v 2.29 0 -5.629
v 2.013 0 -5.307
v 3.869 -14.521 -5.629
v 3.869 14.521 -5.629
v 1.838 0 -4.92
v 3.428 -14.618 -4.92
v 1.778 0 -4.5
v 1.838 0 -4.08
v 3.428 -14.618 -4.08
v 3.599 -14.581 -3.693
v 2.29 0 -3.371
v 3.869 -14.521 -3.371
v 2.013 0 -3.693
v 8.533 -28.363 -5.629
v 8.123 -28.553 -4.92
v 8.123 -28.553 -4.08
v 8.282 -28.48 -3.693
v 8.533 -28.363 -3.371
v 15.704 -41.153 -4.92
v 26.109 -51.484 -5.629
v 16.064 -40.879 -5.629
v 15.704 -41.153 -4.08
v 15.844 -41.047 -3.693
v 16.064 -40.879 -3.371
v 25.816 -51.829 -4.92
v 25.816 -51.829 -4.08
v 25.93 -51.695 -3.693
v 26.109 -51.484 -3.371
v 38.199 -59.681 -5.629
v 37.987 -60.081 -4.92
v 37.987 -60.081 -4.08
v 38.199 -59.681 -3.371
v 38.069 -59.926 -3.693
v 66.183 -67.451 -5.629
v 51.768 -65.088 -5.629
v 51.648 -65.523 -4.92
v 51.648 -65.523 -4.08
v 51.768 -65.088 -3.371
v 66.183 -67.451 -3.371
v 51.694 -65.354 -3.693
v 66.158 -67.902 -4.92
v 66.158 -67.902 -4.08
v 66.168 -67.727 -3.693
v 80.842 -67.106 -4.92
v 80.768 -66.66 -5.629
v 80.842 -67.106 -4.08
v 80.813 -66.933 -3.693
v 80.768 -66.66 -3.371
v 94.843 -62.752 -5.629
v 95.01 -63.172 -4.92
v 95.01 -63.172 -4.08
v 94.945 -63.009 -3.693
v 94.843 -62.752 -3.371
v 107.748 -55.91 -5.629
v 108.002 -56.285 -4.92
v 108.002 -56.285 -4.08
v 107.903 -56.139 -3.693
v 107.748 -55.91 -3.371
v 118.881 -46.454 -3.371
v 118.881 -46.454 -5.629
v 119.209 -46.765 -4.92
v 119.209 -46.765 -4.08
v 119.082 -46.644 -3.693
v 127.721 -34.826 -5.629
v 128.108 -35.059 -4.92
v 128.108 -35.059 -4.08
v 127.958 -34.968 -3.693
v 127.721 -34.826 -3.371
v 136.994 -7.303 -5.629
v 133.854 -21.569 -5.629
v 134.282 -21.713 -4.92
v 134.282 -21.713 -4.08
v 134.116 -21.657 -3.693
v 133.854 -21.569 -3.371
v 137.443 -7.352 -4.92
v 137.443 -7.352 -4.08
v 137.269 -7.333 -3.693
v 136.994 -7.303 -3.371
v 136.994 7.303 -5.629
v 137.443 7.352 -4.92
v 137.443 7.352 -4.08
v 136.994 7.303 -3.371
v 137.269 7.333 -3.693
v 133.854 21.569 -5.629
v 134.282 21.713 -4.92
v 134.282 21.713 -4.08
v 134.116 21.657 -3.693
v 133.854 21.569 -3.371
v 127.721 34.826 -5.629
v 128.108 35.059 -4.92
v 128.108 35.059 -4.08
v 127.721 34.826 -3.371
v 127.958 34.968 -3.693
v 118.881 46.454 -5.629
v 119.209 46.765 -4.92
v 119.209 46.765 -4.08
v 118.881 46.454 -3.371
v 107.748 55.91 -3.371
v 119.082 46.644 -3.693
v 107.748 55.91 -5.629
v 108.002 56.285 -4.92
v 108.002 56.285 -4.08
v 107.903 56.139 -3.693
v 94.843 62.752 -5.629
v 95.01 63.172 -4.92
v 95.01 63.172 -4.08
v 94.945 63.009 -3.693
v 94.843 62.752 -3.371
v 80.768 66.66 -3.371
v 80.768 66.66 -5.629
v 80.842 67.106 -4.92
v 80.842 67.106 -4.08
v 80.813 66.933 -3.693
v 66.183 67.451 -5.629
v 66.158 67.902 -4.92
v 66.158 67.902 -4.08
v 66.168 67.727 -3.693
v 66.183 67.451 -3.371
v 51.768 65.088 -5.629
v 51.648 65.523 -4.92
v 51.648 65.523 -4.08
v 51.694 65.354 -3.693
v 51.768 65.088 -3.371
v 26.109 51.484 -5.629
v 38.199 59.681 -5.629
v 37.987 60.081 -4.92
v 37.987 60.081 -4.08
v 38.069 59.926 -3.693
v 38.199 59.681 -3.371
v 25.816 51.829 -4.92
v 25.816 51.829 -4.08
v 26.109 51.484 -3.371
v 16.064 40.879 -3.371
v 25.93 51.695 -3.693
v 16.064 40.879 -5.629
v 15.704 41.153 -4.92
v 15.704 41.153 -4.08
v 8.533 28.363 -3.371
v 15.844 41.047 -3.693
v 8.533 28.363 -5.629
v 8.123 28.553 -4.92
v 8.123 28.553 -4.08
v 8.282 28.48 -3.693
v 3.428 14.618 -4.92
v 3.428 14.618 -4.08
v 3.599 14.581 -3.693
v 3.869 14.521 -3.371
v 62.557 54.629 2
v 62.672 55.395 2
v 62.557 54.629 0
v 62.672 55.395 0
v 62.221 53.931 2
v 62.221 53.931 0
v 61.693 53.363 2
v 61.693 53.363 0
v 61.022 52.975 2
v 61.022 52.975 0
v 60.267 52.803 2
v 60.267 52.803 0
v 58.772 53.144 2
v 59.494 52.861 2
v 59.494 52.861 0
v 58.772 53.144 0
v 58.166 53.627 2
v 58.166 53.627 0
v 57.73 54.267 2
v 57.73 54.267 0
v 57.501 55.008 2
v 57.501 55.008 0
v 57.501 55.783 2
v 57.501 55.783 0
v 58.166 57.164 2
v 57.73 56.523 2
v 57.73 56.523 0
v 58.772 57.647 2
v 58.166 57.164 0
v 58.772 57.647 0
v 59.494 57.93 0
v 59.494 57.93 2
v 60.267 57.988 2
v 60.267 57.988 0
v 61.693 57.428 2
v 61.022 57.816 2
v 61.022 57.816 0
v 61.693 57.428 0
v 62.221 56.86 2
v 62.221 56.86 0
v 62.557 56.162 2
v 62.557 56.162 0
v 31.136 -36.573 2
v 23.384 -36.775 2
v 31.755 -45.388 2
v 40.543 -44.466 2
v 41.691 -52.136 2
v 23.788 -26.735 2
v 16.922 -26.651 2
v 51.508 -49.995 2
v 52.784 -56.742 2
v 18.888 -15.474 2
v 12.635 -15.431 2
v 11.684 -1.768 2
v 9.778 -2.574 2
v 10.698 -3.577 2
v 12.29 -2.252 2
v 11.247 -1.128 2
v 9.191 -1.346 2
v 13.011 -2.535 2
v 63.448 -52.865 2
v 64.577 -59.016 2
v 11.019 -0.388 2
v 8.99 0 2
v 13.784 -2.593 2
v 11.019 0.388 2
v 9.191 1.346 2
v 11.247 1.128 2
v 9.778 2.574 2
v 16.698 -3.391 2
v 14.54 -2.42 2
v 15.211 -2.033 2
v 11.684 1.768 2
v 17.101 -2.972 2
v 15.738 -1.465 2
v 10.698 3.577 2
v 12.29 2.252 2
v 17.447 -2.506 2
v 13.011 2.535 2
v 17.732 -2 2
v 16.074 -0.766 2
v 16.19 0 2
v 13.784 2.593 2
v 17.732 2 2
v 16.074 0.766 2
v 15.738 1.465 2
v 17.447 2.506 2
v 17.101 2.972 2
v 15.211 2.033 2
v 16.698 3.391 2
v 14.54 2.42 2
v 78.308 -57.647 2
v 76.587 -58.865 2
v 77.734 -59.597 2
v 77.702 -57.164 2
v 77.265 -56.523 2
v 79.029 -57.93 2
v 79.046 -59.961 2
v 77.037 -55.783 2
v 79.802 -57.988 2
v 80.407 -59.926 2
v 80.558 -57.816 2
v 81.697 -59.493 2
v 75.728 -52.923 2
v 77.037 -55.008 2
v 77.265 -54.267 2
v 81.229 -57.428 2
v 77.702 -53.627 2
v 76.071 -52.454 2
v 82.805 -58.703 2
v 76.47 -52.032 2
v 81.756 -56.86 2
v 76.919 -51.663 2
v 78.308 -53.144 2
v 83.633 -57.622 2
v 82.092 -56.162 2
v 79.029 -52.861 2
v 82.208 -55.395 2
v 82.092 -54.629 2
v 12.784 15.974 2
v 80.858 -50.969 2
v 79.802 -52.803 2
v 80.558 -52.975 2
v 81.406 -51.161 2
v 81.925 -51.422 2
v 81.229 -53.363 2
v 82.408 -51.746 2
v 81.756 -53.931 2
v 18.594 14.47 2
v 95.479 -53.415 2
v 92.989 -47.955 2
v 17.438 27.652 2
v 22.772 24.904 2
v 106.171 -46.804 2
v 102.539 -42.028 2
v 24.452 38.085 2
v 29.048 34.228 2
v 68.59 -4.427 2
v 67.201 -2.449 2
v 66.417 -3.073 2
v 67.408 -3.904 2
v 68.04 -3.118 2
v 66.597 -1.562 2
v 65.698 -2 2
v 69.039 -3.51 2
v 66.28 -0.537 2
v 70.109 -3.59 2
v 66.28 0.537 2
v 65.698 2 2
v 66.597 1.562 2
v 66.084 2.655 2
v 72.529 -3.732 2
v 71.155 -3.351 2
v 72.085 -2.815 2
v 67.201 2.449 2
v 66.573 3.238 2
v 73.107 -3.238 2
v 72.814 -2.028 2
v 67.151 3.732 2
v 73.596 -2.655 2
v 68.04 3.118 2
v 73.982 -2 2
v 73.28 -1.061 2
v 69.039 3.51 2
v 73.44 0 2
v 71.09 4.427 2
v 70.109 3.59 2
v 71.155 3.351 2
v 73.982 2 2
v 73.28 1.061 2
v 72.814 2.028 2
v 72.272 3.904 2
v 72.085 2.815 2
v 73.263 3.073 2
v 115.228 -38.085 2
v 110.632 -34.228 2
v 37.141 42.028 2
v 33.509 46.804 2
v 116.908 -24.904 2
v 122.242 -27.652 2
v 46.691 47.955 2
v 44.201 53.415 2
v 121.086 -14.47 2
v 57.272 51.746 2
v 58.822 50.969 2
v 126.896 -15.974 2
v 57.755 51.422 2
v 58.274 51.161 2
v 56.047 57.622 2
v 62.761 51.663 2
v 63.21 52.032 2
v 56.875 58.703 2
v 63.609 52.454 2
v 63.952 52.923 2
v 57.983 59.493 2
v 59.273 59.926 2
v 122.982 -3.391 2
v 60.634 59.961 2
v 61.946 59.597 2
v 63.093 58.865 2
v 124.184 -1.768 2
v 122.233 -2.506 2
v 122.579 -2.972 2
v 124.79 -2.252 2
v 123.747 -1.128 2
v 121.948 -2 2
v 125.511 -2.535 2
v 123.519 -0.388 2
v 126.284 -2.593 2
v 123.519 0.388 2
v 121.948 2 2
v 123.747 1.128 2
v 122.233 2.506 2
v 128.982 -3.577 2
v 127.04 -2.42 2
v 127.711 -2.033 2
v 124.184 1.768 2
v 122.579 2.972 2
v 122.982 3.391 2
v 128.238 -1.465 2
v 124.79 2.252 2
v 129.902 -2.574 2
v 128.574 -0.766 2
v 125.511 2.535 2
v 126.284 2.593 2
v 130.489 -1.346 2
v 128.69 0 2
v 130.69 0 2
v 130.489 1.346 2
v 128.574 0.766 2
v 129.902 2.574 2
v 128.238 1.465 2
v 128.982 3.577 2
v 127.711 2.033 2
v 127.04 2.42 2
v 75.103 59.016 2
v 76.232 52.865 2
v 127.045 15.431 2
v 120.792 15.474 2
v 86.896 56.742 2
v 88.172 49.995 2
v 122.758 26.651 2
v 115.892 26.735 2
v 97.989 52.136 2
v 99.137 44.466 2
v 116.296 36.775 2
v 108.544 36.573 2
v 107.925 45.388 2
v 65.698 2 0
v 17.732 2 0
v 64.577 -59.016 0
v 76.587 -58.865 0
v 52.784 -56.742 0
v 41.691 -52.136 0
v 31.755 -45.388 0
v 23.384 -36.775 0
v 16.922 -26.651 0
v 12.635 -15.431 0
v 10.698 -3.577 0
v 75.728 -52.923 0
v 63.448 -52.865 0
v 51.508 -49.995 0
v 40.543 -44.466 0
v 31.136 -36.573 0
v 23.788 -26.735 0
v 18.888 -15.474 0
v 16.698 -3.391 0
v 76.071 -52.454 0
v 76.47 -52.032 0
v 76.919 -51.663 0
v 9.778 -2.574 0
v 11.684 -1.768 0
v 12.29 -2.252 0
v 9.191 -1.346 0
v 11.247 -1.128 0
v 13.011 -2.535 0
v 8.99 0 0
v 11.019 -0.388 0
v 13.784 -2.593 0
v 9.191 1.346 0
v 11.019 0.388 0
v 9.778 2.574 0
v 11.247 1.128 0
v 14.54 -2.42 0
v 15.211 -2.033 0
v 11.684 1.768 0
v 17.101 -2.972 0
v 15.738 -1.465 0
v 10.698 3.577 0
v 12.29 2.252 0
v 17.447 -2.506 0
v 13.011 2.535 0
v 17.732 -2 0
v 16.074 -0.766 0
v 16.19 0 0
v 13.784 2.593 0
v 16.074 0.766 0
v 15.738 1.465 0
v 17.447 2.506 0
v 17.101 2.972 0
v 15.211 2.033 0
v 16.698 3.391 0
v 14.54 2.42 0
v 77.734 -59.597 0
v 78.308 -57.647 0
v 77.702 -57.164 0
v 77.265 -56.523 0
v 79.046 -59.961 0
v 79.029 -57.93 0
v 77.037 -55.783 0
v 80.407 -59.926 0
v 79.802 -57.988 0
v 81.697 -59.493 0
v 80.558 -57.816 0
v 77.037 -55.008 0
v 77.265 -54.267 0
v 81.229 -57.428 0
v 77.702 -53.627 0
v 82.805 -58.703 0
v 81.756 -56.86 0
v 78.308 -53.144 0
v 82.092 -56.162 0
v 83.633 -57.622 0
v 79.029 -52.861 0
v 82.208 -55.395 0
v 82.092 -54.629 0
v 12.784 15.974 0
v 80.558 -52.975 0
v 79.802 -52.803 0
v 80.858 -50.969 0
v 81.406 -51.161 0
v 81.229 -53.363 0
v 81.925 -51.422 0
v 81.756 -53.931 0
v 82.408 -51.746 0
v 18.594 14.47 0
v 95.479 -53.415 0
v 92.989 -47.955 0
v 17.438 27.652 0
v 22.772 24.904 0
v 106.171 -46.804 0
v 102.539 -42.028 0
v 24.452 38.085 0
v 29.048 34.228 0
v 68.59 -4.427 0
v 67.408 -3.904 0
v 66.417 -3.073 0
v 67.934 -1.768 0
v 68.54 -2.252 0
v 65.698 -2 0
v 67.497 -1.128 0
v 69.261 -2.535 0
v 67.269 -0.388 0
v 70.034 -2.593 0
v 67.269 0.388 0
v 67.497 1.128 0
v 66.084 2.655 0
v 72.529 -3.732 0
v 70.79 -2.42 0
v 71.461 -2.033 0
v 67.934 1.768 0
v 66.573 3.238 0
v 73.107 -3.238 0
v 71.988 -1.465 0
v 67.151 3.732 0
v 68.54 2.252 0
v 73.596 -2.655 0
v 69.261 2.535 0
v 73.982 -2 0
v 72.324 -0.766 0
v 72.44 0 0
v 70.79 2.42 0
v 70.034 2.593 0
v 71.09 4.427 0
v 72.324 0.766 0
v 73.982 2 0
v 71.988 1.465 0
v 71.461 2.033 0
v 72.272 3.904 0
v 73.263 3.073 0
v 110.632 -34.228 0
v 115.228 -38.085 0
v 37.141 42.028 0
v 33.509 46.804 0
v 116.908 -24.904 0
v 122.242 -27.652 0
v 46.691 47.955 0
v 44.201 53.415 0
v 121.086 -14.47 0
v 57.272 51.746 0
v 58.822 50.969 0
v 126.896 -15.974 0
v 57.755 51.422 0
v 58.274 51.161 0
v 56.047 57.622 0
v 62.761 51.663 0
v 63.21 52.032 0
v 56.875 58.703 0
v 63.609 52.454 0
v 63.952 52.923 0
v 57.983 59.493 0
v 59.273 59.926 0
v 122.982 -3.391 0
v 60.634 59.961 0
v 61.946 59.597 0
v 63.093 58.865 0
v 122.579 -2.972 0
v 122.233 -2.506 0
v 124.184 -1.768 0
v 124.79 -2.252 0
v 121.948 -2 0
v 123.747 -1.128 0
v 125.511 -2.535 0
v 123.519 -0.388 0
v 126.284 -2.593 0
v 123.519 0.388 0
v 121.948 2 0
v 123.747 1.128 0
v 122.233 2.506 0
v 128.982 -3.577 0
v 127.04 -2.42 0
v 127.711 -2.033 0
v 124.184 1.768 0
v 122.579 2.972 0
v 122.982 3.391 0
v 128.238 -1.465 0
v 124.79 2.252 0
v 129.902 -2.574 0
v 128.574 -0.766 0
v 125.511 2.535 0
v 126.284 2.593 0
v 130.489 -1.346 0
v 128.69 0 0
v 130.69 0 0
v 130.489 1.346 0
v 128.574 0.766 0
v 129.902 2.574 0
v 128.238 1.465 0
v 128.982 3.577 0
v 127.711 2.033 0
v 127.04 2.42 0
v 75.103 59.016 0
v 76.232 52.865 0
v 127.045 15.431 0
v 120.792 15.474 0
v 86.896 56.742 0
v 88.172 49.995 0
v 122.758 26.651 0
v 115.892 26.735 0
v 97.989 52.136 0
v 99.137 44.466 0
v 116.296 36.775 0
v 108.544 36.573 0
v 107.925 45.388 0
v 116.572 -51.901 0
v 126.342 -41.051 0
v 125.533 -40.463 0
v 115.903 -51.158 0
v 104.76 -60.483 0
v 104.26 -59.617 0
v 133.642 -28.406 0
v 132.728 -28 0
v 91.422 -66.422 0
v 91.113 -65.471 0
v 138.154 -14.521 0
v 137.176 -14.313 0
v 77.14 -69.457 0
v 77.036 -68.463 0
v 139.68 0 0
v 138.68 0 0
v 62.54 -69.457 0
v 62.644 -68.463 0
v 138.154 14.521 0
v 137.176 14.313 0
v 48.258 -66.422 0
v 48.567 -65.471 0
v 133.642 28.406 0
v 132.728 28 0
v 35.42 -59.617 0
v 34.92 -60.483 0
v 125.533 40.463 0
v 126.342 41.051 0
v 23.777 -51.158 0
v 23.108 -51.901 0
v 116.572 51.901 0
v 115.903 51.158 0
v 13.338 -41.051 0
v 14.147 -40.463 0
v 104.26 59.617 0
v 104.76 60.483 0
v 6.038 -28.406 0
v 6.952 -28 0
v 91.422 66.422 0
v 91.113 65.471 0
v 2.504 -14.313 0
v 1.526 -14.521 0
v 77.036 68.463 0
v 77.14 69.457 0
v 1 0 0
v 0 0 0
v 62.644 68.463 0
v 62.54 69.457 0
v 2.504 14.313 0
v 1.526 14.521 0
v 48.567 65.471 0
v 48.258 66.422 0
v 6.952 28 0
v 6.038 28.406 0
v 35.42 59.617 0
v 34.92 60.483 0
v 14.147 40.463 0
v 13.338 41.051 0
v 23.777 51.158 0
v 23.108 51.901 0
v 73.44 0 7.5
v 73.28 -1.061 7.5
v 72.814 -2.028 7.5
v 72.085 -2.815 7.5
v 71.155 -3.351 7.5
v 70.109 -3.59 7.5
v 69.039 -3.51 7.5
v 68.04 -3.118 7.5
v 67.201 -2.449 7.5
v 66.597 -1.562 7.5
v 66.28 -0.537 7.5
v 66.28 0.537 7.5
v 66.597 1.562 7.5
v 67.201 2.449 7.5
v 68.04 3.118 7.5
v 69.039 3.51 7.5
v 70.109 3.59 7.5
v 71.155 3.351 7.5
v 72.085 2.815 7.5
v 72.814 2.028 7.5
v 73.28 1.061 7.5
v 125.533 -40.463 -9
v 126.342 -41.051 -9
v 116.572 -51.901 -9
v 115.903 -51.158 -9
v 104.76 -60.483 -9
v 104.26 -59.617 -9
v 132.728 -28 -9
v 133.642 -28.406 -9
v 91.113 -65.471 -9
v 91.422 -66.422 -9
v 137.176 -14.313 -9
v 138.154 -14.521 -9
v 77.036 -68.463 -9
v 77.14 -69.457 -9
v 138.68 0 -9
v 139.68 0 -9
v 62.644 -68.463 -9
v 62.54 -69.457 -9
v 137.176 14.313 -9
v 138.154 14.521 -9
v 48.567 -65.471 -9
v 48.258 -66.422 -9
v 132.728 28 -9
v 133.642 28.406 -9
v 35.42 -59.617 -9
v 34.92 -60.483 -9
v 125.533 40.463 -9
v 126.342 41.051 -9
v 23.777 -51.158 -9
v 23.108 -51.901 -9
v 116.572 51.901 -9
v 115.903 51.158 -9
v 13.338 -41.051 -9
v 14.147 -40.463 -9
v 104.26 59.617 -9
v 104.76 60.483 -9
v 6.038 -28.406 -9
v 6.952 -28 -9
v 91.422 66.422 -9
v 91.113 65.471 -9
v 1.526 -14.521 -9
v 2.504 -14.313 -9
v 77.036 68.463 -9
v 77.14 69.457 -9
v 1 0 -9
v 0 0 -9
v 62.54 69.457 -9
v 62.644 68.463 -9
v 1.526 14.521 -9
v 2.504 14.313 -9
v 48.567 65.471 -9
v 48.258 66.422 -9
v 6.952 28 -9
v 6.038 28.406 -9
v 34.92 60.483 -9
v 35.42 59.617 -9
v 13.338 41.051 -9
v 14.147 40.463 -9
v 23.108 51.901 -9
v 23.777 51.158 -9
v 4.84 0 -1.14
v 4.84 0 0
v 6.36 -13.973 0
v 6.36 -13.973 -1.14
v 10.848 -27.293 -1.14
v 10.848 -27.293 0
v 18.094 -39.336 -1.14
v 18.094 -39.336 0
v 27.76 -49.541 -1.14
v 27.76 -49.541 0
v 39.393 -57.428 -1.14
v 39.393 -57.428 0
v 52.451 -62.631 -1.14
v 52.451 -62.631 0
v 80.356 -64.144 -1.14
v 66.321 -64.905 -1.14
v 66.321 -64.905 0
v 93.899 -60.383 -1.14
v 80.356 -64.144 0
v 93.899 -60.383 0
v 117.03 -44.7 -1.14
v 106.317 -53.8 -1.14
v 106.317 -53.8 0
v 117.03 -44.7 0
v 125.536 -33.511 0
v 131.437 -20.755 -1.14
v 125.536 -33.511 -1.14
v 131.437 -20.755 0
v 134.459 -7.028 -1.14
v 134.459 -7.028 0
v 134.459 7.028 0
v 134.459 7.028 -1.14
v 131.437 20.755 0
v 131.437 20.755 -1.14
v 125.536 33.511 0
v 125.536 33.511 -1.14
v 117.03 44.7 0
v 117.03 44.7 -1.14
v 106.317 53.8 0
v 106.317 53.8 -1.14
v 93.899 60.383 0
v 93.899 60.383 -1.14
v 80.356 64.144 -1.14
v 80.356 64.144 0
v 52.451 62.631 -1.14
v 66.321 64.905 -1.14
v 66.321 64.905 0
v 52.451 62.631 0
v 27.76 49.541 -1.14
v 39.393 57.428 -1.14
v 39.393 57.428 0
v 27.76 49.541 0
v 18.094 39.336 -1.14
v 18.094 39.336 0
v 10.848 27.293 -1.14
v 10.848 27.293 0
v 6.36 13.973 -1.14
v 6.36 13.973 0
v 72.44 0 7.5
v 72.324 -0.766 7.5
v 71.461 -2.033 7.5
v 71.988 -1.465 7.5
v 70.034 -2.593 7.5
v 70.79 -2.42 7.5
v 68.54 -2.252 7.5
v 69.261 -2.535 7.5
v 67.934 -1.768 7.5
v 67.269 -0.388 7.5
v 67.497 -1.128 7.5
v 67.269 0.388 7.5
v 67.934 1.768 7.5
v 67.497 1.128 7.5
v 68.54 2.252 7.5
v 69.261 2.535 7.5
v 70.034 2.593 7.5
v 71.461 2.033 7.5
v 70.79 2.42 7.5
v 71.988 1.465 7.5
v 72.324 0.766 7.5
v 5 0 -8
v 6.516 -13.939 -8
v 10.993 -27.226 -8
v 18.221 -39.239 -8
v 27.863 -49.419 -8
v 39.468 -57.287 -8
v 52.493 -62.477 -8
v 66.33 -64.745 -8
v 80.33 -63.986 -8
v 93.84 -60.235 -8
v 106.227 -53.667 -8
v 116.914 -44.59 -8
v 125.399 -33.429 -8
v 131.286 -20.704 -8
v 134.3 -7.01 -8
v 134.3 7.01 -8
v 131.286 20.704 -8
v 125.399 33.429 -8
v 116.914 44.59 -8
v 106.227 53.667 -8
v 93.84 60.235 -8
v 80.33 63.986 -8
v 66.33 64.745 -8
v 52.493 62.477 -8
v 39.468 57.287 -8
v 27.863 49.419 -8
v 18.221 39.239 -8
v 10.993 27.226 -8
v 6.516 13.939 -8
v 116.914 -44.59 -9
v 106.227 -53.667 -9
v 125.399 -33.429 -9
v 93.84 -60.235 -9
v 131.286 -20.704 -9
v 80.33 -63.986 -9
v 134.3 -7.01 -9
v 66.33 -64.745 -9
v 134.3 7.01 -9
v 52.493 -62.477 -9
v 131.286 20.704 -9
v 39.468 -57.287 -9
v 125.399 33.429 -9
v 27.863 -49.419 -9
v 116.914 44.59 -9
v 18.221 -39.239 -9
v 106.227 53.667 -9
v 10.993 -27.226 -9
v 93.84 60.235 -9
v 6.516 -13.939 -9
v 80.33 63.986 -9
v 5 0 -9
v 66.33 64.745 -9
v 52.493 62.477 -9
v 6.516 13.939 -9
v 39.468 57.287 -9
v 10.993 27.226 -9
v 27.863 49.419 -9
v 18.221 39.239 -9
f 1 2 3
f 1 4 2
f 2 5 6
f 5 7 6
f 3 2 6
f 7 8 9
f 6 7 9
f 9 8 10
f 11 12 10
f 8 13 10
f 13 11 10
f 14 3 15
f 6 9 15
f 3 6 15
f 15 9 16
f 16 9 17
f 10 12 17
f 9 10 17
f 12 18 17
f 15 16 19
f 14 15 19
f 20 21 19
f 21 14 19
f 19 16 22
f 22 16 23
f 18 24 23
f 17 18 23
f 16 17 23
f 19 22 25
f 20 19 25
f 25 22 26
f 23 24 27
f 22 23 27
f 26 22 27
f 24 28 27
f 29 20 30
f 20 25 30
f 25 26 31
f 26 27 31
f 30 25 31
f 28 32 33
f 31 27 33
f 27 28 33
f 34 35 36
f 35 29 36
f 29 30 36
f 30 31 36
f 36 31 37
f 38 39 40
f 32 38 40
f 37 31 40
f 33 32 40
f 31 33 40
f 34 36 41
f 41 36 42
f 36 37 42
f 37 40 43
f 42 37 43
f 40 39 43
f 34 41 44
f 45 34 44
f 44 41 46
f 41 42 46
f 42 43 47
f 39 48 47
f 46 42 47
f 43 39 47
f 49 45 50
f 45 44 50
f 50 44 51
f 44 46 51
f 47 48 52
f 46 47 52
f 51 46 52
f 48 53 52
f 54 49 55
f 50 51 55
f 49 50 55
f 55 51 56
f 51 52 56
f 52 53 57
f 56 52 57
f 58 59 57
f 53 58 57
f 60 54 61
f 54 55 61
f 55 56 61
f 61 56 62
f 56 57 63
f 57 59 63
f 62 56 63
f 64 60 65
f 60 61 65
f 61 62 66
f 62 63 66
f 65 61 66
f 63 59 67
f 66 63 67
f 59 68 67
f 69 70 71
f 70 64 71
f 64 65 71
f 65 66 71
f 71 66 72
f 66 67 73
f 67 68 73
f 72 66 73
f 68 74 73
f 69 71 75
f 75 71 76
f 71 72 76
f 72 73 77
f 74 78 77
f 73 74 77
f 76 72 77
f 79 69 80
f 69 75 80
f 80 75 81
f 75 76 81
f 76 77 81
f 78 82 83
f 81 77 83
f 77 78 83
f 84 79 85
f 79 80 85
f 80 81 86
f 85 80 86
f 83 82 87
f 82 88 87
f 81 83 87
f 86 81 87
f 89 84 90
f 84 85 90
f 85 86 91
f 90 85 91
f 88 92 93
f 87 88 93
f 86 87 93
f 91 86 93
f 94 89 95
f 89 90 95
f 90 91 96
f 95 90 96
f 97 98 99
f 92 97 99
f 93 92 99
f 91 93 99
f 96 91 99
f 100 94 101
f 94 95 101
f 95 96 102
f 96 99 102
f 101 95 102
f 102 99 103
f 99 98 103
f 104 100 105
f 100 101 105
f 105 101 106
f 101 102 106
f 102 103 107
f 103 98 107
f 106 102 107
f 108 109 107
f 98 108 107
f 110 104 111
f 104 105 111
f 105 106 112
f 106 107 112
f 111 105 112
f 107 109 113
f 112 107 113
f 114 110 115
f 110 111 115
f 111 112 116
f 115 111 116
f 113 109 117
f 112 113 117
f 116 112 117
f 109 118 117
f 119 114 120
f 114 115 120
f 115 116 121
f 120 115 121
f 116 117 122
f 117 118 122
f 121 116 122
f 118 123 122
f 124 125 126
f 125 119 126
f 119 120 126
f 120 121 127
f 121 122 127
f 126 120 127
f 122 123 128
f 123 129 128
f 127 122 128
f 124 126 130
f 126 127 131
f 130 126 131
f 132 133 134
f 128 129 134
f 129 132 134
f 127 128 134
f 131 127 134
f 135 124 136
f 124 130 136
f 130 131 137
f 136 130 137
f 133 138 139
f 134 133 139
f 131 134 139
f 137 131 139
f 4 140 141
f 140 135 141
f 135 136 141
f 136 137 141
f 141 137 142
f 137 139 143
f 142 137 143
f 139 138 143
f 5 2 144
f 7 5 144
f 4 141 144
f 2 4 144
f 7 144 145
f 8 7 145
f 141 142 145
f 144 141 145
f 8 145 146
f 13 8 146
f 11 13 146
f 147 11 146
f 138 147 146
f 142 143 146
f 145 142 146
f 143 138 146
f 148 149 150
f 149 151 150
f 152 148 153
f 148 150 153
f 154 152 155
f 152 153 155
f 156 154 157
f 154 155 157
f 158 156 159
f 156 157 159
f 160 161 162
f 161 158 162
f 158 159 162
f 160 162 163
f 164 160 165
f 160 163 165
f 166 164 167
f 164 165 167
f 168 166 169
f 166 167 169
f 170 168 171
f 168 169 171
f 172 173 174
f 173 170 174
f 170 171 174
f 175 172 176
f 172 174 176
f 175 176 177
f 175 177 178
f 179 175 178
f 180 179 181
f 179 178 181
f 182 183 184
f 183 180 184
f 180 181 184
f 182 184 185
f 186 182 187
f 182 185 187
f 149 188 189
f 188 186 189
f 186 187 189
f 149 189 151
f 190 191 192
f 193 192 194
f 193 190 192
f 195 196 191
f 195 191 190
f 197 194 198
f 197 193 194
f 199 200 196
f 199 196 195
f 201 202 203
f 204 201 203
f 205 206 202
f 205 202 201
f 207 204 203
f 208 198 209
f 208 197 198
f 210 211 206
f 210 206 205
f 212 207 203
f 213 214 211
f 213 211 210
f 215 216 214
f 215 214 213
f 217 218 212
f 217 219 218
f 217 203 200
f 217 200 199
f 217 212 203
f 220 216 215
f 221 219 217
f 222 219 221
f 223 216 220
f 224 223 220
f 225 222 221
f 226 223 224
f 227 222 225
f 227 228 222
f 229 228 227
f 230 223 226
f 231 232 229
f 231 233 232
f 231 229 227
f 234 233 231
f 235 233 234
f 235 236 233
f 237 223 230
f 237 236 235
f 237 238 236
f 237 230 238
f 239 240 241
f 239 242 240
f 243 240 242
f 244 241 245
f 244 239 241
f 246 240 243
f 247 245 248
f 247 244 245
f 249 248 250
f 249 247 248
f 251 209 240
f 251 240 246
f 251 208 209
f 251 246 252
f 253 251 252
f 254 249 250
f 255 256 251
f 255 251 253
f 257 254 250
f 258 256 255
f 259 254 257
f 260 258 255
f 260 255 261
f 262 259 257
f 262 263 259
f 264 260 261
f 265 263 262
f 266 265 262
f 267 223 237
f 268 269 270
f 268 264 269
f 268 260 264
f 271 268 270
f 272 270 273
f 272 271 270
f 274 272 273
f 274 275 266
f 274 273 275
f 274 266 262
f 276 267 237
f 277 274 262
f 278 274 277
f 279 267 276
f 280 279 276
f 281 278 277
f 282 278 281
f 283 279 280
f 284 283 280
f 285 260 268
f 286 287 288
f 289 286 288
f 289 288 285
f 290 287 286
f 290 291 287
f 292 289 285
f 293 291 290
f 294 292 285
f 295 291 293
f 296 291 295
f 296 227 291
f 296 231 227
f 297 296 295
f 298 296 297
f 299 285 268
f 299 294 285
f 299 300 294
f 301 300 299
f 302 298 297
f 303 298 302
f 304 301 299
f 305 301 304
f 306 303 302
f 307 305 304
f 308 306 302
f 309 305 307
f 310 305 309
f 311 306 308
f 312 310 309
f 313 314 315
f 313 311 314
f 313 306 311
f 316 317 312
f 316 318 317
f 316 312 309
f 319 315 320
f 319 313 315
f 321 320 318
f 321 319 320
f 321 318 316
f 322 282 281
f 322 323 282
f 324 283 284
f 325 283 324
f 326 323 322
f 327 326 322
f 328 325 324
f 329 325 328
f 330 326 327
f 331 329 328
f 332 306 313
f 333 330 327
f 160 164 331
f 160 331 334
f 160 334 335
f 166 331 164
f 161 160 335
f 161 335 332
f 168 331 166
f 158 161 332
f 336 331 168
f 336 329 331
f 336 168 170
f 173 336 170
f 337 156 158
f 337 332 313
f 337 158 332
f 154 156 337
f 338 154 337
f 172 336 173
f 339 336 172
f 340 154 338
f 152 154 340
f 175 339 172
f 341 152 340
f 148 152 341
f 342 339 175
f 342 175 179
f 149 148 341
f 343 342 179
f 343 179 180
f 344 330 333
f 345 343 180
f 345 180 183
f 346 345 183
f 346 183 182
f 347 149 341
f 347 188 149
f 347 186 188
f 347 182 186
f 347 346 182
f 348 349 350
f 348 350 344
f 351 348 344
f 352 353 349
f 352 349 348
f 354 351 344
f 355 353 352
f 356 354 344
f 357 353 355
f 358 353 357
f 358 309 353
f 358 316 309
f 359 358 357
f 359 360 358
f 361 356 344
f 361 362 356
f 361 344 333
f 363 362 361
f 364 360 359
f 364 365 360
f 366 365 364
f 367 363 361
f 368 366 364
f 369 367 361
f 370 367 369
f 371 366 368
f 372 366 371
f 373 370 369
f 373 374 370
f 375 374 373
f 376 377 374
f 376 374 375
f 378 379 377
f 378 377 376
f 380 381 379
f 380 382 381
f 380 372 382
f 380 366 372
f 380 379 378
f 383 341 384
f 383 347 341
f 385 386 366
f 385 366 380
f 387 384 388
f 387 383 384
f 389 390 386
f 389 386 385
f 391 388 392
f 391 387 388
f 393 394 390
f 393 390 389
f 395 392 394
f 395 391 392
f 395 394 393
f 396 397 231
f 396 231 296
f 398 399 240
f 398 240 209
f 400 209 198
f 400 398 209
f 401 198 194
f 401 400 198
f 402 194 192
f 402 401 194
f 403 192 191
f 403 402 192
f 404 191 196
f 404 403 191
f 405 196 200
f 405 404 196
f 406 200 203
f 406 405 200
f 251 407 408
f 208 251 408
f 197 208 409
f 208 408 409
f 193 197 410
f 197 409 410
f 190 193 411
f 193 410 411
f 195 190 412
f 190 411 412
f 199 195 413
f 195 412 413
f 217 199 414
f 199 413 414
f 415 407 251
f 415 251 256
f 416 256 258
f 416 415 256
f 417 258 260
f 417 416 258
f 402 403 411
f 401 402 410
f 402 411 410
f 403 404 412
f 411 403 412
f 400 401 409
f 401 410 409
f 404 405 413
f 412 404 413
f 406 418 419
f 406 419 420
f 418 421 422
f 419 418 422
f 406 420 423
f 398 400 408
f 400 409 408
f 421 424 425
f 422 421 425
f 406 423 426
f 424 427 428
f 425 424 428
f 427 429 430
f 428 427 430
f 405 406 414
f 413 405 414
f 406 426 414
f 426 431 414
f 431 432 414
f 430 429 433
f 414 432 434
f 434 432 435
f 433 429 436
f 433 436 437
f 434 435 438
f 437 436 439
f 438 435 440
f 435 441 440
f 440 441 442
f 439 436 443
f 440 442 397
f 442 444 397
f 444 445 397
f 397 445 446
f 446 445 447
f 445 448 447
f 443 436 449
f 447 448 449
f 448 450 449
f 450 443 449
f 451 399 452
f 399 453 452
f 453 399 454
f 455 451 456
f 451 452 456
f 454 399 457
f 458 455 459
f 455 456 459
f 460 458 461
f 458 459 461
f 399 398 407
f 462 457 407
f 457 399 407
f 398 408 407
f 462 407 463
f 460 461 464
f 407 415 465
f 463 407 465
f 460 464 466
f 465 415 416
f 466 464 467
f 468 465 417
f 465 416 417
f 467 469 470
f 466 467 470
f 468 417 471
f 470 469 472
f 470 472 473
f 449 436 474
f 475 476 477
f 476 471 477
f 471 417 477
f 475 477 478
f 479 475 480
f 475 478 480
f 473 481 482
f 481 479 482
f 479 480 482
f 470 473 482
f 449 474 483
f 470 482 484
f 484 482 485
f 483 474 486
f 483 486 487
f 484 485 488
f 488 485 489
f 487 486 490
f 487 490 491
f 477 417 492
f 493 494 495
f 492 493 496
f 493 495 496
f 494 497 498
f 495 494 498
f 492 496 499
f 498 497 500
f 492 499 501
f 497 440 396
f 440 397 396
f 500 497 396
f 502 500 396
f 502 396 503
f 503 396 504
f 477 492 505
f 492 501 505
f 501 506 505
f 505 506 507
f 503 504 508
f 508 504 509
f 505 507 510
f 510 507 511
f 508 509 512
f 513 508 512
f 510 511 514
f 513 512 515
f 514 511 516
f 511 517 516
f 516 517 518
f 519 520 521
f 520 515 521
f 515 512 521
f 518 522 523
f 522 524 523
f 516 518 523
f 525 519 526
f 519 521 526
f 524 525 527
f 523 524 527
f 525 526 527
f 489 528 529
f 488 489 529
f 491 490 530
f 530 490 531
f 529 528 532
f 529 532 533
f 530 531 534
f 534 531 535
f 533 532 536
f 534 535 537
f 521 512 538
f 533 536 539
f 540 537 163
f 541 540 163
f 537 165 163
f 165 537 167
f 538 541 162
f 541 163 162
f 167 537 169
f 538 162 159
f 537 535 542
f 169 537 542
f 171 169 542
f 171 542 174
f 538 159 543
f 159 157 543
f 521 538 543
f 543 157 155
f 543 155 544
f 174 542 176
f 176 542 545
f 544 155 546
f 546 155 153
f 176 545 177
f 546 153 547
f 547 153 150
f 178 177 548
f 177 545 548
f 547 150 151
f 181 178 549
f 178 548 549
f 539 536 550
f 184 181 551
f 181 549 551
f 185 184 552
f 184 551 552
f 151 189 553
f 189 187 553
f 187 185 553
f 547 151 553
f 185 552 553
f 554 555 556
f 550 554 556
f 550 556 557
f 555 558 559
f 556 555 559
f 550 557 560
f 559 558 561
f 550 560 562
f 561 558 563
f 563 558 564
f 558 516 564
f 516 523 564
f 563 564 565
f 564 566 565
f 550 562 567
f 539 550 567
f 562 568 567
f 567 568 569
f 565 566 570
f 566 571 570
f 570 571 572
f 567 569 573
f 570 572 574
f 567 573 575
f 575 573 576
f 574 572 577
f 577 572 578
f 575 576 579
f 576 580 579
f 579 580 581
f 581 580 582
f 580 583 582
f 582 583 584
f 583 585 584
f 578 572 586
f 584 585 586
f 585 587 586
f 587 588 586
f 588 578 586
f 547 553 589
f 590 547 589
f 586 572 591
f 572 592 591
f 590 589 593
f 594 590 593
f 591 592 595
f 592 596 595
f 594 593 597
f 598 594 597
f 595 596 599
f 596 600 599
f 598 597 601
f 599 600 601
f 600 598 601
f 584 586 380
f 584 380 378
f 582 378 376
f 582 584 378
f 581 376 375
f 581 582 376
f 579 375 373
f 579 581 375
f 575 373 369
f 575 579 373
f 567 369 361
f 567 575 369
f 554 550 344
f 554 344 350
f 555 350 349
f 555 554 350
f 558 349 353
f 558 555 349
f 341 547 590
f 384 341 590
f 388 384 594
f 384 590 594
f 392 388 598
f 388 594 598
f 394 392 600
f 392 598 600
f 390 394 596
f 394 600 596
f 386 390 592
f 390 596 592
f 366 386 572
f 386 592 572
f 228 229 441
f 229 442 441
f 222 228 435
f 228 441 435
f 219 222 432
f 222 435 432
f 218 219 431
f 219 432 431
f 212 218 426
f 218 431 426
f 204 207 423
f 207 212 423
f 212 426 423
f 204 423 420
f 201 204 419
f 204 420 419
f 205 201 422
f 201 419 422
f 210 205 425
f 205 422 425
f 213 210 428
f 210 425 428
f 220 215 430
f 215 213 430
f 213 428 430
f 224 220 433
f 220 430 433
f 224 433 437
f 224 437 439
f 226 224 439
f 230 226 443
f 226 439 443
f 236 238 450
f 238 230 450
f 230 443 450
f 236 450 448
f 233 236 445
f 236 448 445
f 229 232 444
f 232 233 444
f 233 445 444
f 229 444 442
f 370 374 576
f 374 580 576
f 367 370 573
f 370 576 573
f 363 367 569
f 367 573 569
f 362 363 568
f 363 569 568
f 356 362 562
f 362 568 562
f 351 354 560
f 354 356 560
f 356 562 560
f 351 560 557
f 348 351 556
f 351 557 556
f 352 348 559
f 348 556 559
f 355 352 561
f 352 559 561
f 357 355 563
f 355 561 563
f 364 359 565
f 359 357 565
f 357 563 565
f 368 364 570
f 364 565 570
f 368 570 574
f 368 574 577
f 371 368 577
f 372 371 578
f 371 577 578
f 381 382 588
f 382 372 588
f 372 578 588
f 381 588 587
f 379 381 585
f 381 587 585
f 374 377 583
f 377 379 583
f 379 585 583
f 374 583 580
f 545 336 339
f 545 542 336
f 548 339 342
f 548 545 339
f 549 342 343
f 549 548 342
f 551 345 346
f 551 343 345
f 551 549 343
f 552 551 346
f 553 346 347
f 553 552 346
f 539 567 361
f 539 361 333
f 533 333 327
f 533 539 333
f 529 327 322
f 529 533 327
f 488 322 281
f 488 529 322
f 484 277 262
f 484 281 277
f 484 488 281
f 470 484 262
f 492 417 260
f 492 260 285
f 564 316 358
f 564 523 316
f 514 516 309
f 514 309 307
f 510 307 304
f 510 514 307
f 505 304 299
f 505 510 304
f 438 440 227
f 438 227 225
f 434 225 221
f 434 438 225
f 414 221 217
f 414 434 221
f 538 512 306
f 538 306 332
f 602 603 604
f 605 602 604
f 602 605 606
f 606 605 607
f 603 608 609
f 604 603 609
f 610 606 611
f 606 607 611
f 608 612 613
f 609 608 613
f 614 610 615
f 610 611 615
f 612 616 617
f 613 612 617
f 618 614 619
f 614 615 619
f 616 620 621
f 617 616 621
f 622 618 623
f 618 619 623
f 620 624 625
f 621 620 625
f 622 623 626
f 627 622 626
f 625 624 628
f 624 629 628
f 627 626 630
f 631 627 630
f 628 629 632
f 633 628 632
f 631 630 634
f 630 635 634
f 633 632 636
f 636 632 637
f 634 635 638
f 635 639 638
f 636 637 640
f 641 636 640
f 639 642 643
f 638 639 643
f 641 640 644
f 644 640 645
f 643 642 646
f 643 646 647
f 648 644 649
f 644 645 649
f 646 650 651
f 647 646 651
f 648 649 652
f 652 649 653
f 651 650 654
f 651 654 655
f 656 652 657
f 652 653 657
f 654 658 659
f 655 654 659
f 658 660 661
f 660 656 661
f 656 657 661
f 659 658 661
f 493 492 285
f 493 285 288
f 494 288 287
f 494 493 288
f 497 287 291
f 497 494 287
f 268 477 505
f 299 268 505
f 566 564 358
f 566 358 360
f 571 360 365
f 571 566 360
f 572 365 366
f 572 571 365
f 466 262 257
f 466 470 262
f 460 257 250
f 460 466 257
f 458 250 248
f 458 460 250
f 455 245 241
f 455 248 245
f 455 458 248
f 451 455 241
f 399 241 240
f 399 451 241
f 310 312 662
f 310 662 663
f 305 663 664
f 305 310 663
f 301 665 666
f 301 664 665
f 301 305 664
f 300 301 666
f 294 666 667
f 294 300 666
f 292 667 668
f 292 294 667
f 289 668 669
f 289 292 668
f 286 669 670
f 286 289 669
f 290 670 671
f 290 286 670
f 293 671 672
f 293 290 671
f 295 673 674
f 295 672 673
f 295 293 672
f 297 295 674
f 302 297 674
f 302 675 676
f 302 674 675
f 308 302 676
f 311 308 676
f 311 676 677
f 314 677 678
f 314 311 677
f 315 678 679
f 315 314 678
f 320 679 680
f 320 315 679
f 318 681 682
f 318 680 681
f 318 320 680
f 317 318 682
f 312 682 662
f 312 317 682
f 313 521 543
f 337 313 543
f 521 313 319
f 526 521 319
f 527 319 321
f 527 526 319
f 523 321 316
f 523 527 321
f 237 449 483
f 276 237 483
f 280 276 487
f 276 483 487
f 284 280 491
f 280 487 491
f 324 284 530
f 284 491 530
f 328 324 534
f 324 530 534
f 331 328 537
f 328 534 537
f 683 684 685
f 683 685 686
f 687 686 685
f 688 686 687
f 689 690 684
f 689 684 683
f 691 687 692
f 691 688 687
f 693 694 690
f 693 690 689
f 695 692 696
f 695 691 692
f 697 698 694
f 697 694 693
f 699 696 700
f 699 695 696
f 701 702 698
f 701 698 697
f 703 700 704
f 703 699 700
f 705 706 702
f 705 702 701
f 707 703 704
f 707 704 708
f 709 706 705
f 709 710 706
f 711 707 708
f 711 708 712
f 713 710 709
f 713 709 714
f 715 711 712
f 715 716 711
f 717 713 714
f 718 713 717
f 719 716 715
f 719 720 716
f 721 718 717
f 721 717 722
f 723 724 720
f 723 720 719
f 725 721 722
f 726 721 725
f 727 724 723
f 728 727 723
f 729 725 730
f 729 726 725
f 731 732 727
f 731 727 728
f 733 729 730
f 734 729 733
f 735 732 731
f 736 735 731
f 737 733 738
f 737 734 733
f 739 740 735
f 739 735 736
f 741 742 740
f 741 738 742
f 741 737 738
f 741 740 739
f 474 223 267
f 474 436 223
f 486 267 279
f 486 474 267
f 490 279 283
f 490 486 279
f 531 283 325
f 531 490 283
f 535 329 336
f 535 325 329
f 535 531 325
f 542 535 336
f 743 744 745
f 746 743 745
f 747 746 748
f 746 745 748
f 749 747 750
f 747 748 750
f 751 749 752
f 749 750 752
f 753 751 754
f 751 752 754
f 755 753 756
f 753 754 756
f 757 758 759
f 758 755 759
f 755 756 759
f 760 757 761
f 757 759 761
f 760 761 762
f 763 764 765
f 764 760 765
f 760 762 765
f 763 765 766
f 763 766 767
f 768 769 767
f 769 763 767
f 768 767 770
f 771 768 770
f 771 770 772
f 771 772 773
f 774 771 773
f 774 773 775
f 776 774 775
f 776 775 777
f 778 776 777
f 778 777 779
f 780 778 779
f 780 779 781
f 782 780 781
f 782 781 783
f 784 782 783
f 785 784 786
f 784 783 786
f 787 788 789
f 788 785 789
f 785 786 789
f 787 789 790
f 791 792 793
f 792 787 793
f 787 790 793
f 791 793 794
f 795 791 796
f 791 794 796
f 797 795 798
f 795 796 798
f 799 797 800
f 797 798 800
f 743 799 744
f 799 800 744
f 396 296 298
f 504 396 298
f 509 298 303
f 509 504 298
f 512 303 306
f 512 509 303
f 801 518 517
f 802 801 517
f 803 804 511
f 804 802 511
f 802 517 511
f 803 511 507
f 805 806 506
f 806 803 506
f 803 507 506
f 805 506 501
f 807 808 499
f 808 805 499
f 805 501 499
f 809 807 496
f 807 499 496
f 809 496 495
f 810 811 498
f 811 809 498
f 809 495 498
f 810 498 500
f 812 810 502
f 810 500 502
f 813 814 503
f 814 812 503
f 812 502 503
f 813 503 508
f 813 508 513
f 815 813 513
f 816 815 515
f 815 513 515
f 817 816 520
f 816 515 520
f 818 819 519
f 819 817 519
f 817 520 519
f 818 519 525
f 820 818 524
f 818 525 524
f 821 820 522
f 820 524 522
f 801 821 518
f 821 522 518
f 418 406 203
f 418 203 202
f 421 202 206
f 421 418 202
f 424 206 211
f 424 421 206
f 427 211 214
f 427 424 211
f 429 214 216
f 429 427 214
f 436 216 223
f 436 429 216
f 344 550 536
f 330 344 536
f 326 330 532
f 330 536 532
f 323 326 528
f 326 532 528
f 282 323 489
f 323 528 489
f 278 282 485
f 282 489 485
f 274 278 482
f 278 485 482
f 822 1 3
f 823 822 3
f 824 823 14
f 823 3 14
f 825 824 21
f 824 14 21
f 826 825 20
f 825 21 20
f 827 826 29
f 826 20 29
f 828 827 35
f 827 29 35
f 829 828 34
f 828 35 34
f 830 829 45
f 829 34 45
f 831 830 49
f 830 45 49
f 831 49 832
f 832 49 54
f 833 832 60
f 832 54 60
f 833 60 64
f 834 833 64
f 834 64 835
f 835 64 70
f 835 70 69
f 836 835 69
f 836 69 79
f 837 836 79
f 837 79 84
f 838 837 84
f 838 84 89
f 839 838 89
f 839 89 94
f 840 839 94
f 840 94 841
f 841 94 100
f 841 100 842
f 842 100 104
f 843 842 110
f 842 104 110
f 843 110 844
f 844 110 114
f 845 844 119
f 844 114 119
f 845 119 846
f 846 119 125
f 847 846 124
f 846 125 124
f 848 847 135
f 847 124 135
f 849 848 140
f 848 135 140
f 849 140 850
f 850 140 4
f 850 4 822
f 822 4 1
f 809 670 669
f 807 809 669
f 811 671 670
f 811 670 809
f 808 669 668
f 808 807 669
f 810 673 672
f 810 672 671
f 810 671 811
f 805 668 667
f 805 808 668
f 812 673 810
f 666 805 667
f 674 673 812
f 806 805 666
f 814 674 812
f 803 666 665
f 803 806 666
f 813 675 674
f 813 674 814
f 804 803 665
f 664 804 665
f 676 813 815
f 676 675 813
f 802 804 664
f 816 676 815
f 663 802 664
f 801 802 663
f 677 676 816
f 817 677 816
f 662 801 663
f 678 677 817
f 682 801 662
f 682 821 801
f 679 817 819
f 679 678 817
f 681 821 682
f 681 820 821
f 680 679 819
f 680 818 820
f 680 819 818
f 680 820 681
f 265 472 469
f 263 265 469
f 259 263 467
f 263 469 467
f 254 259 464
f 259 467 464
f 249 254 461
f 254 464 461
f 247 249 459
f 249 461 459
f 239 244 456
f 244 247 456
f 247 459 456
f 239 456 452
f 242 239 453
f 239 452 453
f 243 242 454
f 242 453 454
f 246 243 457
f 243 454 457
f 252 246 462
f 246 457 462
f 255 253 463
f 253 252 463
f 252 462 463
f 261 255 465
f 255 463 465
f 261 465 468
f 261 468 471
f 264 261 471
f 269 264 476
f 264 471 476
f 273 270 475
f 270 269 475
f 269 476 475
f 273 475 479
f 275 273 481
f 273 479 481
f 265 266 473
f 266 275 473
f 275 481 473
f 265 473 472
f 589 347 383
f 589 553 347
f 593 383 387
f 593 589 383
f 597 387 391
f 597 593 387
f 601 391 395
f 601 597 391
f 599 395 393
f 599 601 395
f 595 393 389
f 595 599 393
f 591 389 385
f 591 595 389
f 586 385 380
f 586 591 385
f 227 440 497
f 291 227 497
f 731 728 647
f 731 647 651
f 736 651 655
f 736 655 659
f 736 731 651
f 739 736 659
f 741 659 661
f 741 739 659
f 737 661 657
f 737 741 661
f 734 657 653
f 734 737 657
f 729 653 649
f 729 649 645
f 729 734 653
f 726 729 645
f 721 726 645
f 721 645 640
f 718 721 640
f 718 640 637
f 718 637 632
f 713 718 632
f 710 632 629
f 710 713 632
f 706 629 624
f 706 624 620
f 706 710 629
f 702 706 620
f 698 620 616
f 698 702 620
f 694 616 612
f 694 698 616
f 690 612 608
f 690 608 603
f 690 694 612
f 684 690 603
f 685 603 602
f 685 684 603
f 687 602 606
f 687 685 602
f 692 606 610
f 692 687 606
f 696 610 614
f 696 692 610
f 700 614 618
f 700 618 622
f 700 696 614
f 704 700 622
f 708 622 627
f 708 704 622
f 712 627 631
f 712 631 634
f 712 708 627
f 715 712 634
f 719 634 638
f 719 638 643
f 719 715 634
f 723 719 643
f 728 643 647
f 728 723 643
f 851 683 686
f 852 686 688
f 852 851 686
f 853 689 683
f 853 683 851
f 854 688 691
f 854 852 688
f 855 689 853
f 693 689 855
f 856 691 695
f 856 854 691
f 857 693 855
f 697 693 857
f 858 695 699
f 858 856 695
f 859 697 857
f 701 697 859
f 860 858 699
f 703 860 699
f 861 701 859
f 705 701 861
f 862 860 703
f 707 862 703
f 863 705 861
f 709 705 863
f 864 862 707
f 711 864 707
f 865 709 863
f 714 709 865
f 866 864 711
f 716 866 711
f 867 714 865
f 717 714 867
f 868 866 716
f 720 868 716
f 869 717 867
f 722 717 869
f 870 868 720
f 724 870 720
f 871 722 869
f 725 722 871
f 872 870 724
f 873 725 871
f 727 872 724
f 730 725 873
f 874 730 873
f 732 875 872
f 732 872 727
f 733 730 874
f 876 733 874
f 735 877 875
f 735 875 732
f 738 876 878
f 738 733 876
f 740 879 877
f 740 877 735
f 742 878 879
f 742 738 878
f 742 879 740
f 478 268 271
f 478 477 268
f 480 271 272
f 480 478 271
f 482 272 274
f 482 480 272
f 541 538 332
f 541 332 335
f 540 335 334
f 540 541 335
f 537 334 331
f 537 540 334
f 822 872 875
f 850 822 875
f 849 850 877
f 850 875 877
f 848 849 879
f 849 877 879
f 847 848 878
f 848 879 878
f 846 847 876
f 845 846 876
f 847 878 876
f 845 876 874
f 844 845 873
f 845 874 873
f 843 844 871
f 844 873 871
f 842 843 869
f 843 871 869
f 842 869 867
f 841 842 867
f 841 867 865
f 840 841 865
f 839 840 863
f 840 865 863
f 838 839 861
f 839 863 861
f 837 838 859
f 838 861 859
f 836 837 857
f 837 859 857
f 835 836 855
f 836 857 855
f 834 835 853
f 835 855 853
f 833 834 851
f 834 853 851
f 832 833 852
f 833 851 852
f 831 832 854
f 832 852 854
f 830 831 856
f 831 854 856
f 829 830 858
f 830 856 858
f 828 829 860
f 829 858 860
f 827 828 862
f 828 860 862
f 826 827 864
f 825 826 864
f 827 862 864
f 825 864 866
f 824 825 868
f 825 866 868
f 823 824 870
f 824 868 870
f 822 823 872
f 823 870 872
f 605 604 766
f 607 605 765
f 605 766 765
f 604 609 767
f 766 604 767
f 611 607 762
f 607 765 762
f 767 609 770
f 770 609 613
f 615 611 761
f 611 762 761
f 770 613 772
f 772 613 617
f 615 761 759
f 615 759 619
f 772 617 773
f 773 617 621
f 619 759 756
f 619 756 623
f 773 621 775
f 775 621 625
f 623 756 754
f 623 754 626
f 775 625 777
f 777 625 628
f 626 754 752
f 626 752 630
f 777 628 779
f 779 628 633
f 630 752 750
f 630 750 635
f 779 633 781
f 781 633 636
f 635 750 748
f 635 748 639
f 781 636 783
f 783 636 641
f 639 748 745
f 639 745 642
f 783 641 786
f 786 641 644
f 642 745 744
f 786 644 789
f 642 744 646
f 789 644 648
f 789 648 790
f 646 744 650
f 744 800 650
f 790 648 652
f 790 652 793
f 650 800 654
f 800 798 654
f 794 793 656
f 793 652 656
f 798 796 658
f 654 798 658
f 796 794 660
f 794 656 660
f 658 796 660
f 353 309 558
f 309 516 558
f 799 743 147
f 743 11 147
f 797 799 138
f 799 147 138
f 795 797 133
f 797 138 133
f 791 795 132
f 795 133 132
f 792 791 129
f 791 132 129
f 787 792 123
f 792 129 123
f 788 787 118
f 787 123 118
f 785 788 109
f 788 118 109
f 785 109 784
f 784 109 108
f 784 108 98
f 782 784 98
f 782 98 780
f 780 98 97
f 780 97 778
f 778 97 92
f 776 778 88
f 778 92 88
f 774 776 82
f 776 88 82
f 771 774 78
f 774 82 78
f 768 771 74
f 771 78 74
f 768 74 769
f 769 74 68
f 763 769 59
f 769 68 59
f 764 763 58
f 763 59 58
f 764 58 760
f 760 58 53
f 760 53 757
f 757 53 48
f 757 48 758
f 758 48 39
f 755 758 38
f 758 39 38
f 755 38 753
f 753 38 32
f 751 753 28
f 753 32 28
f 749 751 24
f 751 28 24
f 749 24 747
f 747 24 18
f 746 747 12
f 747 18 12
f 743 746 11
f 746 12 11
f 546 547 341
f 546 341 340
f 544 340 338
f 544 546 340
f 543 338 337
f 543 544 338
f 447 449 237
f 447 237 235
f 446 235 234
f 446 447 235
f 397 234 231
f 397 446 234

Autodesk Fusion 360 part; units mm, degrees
sketch "Sketch1" plane through (0, 0, 0) normal (0, 1, 0) x (1, 0, 0)
  line L0 (0, 0) -> (0, 9)
  line L1 (0, 9) -> (1, 9)
  line L2 (0, 0) -> (1, 0)
  line L3 (1, 0) -> (4.84, 0)
  line L4 (4.84, 1.14) -> (2.2901, 3.3711)
  line L5 (2.2901, 5.6289) -> (5, 8)
  line L6 (5, 8) -> (5, 9)
  line L7 (5, 9) -> (1, 9)
  line L8 (4.84, 1.14) -> (4.84, 0)
  line L9 (0, 0) -> (4.84, 0)
  arc A0 (2.2901, 5.6289) -> (2.2901, 3.3711) centre (3.2779, 4.5) ccw
  line L10 (4.84, 0) -> (69.84, 0) construction
  line L11 (69.84, 0) -> (69.84, 13) construction
  dimension "d202" = 9
  dimension "d204" = 1.5
  dimension "d211" = 65
revolve "Revolve2" add sketch "Sketch1" angle 360 about axis through (69.84, 0, 0) along (0, 0, -1) makes body 1
sketch "Sketch5" plane through (0, 0, 0) normal (0, 1, 0) x (1, 0, 0)
  line L0 (6.34, 8) -> (20.84, 8)
  line L1 (20.84, 1) -> (6.34, 1)
  arc A0 (20.84, 1) -> (20.84, 8) centre (20.84, 4.5) ccw
  arc A1 (6.34, 8) -> (6.34, 1) centre (6.34, 4.5) ccw
  line L2 (13.59, 8) -> (13.59, 1)
  line L3 (4.84, 0) -> (69.84, 0)
  line L4 (13.59, 1) -> (13.59, 0)
  dimension "d209" = 7
  dimension "d210" = 7
sketch "Sketch6" plane through (0, 0, 0) normal (0, 0, 1) x (1, 0, 0)
  circle A0 centre (69.84, 0) radius 56.25 construction
  circle A1 centre (13.59, 0) radius 2.6
  circle A2 centre (13.59, 0) radius 8 construction
  circle A3 centre (13.59, 0) radius 10.75 construction
  circle A4 centre (69.84, 0) radius 69.84 construction
  circle A5 centre (69.84, 0) radius 65 construction
  circle A6 centre (60.0723, 55.3954) radius 10.75 construction
  circle A7 centre (60.0723, 55.3954) radius 8 construction
  circle A8 centre (60.0723, 55.3954) radius 2.6
  circle A9 centre (79.6077, -55.3954) radius 10.75 construction
  circle A10 centre (79.6077, -55.3954) radius 8 construction
  circle A11 centre (126.09, 0) radius 10.75 construction
  circle A12 centre (126.09, 0) radius 8 construction
  circle A13 centre (126.09, 0) radius 2.6
  circle A14 centre (79.6077, -55.3954) radius 2.6
  arc A15 (63.093, 58.8646) -> (56.0472, 57.6222) centre (60.0723, 55.3954) ccw
  arc A16 (122.9819, 3.3911) -> (63.9516, 52.9234) centre (69.84, 0) ccw
  arc A17 (128.9819, -3.5773) -> (128.9819, 3.5773) centre (126.09, 0) ccw
  arc A18 (128.9819, 3.5773) -> (63.093, 58.8646) centre (69.84, 0) ccw
  arc A19 (83.6328, -57.6222) -> (128.9819, -3.5773) centre (69.84, 0) ccw
  arc A20 (82.4076, -51.7457) -> (122.9819, -3.3911) centre (69.84, 0) ccw
  arc A21 (76.587, -58.8646) -> (83.6328, -57.6222) centre (79.6077, -55.3954) ccw
  arc A22 (57.2724, 51.7457) -> (16.6981, 3.3911) centre (69.84, 0) ccw
  arc A23 (16.6981, -3.3911) -> (75.7284, -52.9234) centre (69.84, 0) ccw
  arc A24 (56.0472, 57.6222) -> (10.6981, 3.5773) centre (69.84, 0) ccw
  arc A25 (10.6981, -3.5773) -> (76.587, -58.8646) centre (69.84, 0) ccw
  arc A26 (10.6981, 3.5773) -> (10.6981, -3.5773) centre (13.59, 0) ccw
  line L0 (17.7325, 2) -> (65.6975, 2)
  line L1 (17.7325, -2) -> (65.6975, -2)
  line L2 (71.0903, 4.4268) -> (62.7612, 51.6632)
  line L3 (62.0481, 55.7077) -> (62.0419, 55.7427)
  line L4 (67.1511, 3.7322) -> (58.822, 50.9686)
  line L5 (58.1089, 55.0131) -> (58.1027, 55.0481)
  arc A27 (57.2724, 51.7457) -> (58.822, 50.9686) centre (60.0723, 55.3954) ccw
  arc A28 (62.7612, 51.6632) -> (63.9516, 52.9234) centre (60.0723, 55.3954) ccw
  arc A29 (16.6981, -3.3911) -> (17.7325, -2) centre (13.59, 0) ccw
  arc A30 (17.7325, 2) -> (16.6981, 3.3911) centre (13.59, 0) ccw
  line L6 (81.5773, -55.0481) -> (81.5711, -55.0131)
  line L7 (80.858, -50.9686) -> (72.5289, -3.7322)
  line L8 (77.6381, -55.7427) -> (77.6319, -55.7077)
  line L9 (76.9188, -51.6632) -> (68.5897, -4.4268)
  arc A31 (82.4076, -51.7457) -> (80.858, -50.9686) centre (79.6077, -55.3954) ccw
  arc A32 (76.9188, -51.6632) -> (75.7284, -52.9234) centre (79.6077, -55.3954) ccw
  line L10 (73.9825, 2) -> (121.9475, 2)
  curve K0
  line L11 (73.9825, 2) -> (121.9475, 2)
  curve K1
  line L12 (73.9825, -2) -> (121.9475, -2)
  curve K2
  line L13 (73.9825, -2) -> (121.9475, -2)
  curve K3
  arc A33 (122.9819, 3.3911) -> (121.9475, 2) centre (126.09, 0) ccw
  arc A34 (121.9475, -2) -> (122.9819, -3.3911) centre (126.09, 0) ccw
  circle A35 centre (69.84, 0) radius 2.6
  arc A36 (65.6975, -2) -> (68.5897, -4.4268) centre (69.84, 0) ccw
  arc A37 (72.5289, -3.7322) -> (73.9825, -2) centre (69.84, 0) ccw
  arc A38 (73.9825, 2) -> (71.0903, 4.4268) centre (69.84, 0) ccw
  arc A39 (67.1511, 3.7322) -> (65.6975, 2) centre (69.84, 0) ccw
  circle A40 centre (69.84, 0) radius 3.6
  point P0 (13.59, 0)
  dimension "d213" = 5.2
  dimension "d214" = 16
  dimension "d215" = 21.5
  dimension "d219" = 5.2
  dimension "d220" = 16
  dimension "d221" = 21.5
  dimension "d224" = 5.2
  dimension "d225" = 5.2
  dimension "d236" = 5.2
  dimension "d238" = 1
extrude "Extrude36" add sketch "Sketch6" along normal blind 2 separate body contours A15 A17 A18 A19 A21 A24 A25 A26 makes body 2
extrude "Extrude37" add sketch "Sketch6" along normal blind 7.5 contours A40 bodies 2
